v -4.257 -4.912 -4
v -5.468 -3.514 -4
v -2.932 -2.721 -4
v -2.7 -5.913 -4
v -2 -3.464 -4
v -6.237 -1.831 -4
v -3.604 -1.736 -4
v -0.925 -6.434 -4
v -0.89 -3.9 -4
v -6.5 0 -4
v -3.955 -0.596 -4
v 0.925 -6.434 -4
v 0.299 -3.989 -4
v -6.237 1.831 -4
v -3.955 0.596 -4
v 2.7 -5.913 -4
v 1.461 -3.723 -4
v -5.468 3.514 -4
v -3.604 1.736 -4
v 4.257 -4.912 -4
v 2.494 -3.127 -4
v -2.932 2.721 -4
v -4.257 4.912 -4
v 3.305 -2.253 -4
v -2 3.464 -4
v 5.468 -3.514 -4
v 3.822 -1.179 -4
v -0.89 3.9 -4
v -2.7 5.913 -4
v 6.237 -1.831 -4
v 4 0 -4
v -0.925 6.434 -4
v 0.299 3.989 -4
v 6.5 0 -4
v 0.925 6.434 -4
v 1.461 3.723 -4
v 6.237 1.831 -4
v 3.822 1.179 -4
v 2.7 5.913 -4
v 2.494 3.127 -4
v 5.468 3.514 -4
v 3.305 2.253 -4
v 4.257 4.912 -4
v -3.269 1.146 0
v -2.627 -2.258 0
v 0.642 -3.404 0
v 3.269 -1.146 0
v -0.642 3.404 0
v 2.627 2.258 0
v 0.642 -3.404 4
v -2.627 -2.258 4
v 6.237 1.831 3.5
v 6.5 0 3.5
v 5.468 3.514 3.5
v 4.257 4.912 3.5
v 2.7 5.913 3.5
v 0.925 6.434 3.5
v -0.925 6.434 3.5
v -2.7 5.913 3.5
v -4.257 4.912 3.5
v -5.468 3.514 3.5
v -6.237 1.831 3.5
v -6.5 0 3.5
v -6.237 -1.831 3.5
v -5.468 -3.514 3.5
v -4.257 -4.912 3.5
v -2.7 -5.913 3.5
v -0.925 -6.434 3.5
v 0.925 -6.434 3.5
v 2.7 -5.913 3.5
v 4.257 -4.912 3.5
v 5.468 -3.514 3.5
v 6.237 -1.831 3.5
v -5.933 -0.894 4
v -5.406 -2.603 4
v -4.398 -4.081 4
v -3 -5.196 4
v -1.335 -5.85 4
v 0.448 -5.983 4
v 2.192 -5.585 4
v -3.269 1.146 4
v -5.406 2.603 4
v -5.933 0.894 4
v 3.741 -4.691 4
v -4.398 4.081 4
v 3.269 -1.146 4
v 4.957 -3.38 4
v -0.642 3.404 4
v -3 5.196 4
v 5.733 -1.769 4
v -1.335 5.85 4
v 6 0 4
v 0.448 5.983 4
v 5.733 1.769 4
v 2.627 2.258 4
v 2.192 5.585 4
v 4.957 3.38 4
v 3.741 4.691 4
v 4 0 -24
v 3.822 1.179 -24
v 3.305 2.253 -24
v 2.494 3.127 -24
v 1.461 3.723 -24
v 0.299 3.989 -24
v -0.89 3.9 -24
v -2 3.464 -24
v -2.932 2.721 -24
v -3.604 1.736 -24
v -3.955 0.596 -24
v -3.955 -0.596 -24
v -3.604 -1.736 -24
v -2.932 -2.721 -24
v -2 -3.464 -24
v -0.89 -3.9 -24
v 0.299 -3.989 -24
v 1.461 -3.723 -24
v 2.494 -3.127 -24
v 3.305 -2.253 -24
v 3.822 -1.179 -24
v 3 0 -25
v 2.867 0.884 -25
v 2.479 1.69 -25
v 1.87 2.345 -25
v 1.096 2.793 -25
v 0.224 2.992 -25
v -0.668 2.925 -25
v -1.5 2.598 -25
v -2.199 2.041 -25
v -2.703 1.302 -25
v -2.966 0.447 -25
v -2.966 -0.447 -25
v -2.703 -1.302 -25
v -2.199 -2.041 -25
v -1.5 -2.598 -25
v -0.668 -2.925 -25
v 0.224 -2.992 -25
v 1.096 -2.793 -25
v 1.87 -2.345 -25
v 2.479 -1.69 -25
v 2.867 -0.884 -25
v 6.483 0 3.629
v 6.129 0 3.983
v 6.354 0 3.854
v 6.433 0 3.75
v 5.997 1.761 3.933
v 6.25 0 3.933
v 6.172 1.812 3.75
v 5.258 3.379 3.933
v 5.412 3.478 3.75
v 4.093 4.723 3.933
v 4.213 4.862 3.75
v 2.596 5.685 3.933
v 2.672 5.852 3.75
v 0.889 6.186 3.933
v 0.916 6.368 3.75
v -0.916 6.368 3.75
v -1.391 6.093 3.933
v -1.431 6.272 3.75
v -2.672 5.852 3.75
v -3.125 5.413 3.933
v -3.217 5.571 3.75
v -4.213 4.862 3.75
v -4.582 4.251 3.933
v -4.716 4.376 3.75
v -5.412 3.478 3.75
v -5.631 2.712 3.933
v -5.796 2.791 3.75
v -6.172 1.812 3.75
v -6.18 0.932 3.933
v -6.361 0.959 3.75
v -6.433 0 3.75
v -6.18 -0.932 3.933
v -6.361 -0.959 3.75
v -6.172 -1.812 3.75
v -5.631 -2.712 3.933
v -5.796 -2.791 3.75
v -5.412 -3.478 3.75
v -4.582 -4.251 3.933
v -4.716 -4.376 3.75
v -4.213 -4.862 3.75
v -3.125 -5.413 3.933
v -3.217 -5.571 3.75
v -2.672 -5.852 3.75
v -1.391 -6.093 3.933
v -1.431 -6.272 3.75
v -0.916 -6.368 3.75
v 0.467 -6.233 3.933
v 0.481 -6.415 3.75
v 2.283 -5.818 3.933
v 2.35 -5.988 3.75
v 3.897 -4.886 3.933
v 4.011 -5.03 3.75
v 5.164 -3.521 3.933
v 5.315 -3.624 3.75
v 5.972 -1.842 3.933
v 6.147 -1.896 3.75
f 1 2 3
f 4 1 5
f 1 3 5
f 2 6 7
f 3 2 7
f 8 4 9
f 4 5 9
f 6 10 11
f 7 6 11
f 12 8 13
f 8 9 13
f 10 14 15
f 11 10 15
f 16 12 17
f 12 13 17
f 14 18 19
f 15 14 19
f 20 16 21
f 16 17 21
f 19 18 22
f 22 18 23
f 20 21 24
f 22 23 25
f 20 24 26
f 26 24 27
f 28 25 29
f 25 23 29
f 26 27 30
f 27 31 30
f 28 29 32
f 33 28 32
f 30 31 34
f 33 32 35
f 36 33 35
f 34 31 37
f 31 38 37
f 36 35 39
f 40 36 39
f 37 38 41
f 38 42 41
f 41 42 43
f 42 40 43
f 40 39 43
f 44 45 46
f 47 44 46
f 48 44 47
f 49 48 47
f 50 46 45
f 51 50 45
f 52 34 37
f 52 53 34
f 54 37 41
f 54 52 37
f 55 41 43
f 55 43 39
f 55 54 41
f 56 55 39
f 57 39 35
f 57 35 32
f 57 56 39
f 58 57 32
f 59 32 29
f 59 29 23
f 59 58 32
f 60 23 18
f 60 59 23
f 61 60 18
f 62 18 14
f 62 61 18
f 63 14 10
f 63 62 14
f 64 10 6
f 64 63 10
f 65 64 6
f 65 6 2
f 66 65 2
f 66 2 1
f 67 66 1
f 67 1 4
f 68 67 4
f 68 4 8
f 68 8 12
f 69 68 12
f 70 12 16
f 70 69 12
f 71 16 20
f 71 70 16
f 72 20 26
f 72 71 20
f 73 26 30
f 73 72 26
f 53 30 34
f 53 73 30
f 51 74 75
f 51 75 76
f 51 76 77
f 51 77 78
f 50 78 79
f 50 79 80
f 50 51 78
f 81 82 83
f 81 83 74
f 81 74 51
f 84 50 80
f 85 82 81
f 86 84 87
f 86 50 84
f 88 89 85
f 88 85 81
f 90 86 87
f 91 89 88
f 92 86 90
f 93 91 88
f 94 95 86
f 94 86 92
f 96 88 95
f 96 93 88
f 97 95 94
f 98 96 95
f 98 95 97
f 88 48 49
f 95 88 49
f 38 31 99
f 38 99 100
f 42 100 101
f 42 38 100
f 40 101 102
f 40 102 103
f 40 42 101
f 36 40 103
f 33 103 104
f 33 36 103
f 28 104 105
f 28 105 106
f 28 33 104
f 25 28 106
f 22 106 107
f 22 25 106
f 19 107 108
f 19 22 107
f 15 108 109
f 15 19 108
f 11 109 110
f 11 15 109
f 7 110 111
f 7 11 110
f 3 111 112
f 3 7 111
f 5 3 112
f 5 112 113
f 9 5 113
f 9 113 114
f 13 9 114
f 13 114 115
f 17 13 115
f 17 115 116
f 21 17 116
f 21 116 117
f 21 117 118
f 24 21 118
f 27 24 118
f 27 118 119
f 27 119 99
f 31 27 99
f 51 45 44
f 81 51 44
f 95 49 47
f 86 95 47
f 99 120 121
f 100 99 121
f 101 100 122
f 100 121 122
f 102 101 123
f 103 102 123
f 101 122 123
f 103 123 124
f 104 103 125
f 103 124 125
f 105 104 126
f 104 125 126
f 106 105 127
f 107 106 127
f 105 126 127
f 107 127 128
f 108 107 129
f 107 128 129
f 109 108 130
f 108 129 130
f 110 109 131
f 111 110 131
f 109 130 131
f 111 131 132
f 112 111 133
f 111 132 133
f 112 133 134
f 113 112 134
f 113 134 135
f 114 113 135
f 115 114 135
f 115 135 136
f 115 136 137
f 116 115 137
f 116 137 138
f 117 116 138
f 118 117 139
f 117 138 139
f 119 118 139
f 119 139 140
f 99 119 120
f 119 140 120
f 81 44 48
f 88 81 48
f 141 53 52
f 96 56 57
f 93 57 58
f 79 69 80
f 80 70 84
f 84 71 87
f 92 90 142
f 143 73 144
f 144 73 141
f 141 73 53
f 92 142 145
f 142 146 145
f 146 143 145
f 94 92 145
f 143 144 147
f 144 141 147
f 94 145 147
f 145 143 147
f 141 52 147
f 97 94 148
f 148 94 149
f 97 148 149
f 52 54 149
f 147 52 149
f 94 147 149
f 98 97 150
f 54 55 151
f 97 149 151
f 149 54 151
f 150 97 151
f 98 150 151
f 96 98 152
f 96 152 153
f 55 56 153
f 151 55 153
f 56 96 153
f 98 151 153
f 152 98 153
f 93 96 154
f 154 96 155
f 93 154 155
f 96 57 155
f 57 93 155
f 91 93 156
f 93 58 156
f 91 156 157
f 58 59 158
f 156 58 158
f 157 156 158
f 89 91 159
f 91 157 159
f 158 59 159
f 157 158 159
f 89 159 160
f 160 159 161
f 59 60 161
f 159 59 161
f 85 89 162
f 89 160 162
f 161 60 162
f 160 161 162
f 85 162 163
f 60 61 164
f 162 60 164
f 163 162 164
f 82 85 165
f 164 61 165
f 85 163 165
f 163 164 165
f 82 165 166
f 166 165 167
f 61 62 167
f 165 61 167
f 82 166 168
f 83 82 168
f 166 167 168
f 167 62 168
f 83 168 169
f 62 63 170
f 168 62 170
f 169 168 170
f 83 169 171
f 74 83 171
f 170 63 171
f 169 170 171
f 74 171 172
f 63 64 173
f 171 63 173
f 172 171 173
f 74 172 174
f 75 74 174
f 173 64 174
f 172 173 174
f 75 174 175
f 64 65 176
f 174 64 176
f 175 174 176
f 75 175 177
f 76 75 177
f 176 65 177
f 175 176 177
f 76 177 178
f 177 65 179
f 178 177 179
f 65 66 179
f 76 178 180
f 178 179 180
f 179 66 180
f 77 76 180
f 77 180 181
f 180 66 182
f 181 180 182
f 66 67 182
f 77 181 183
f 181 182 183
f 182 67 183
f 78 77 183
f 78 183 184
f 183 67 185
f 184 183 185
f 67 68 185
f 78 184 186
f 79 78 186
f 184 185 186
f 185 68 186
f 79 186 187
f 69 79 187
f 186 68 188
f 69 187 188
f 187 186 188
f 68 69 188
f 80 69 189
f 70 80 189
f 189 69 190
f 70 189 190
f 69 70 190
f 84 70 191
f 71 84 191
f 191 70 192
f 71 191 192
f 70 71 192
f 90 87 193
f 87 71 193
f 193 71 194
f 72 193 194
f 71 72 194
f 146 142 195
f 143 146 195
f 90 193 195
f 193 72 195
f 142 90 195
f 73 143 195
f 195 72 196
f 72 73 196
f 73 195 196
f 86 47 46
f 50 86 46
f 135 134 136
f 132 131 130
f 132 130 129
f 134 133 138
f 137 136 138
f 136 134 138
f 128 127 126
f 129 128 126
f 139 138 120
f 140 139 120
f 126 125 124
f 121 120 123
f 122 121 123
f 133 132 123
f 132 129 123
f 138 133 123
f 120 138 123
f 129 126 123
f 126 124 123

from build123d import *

# Parameters (mm, degrees)
F0_R     = 6.5
F0_R_2   = 4
F1_DEPTH = 4
F2_DEPTH = 4
F3_DEPTH = 25
F4_R     = 0.5
F5_SIZE  = 1


with BuildPart() as f1:
    # F0 (on Top) → F1 (new body)
    with BuildSketch(Plane.XY):
        Circle(F0_R)
        Circle(F0_R_2, mode=Mode.SUBTRACT)
        Circle(F0_R_2)
        Polygon((-2.6272431226, -2.2577851038), (-3.2689208174, 1.1463667342), (-0.6416776948, 3.404151838), (2.6272431226, 2.2577851038), (3.2689208174, -1.1463667342), (0.6416776948, -3.404151838), align=None, mode=Mode.SUBTRACT)
        Polygon((-0.6416776948, 3.404151838), (-3.2689208174, 1.1463667342), (-2.6272431226, -2.2577851038), (0.6416776948, -3.404151838), (3.2689208174, -1.1463667342), (2.6272431226, 2.2577851038), align=None)
    extrude(amount=-F1_DEPTH)

    # F0 (on Top) → F2 (join)
    with BuildSketch(Plane.XY):
        Circle(F0_R)
        Circle(F0_R_2, mode=Mode.SUBTRACT)
        Circle(F0_R_2)
        Polygon((-2.6272431226, -2.2577851038), (-3.2689208174, 1.1463667342), (-0.6416776948, 3.404151838), (2.6272431226, 2.2577851038), (3.2689208174, -1.1463667342), (0.6416776948, -3.404151838), align=None, mode=Mode.SUBTRACT)
    extrude(amount=F2_DEPTH)

    # F0 (on Top) → F3 (join)
    with BuildSketch(Plane.XY):
        Circle(F0_R_2)
        Polygon((-2.6272431226, -2.2577851038), (-3.2689208174, 1.1463667342), (-0.6416776948, 3.404151838), (2.6272431226, 2.2577851038), (3.2689208174, -1.1463667342), (0.6416776948, -3.404151838), align=None, mode=Mode.SUBTRACT)
        Polygon((-0.6416776948, 3.404151838), (-3.2689208174, 1.1463667342), (-2.6272431226, -2.2577851038), (0.6416776948, -3.404151838), (3.2689208174, -1.1463667342), (2.6272431226, 2.2577851038), align=None)
    extrude(amount=-F3_DEPTH)

    # F4
    f4_edges = [f1.edges().sort_by_distance(p)[0] for p in [
        (-6.5, 0, 4),
    ]]
    fillet(f4_edges, radius=F4_R)

    # F5
    f5_edges = [f1.edges().sort_by_distance(p)[0] for p in [
        (-4, 0, -25),
    ]]
    chamfer(f5_edges, length=F5_SIZE)


solid = f1.part
